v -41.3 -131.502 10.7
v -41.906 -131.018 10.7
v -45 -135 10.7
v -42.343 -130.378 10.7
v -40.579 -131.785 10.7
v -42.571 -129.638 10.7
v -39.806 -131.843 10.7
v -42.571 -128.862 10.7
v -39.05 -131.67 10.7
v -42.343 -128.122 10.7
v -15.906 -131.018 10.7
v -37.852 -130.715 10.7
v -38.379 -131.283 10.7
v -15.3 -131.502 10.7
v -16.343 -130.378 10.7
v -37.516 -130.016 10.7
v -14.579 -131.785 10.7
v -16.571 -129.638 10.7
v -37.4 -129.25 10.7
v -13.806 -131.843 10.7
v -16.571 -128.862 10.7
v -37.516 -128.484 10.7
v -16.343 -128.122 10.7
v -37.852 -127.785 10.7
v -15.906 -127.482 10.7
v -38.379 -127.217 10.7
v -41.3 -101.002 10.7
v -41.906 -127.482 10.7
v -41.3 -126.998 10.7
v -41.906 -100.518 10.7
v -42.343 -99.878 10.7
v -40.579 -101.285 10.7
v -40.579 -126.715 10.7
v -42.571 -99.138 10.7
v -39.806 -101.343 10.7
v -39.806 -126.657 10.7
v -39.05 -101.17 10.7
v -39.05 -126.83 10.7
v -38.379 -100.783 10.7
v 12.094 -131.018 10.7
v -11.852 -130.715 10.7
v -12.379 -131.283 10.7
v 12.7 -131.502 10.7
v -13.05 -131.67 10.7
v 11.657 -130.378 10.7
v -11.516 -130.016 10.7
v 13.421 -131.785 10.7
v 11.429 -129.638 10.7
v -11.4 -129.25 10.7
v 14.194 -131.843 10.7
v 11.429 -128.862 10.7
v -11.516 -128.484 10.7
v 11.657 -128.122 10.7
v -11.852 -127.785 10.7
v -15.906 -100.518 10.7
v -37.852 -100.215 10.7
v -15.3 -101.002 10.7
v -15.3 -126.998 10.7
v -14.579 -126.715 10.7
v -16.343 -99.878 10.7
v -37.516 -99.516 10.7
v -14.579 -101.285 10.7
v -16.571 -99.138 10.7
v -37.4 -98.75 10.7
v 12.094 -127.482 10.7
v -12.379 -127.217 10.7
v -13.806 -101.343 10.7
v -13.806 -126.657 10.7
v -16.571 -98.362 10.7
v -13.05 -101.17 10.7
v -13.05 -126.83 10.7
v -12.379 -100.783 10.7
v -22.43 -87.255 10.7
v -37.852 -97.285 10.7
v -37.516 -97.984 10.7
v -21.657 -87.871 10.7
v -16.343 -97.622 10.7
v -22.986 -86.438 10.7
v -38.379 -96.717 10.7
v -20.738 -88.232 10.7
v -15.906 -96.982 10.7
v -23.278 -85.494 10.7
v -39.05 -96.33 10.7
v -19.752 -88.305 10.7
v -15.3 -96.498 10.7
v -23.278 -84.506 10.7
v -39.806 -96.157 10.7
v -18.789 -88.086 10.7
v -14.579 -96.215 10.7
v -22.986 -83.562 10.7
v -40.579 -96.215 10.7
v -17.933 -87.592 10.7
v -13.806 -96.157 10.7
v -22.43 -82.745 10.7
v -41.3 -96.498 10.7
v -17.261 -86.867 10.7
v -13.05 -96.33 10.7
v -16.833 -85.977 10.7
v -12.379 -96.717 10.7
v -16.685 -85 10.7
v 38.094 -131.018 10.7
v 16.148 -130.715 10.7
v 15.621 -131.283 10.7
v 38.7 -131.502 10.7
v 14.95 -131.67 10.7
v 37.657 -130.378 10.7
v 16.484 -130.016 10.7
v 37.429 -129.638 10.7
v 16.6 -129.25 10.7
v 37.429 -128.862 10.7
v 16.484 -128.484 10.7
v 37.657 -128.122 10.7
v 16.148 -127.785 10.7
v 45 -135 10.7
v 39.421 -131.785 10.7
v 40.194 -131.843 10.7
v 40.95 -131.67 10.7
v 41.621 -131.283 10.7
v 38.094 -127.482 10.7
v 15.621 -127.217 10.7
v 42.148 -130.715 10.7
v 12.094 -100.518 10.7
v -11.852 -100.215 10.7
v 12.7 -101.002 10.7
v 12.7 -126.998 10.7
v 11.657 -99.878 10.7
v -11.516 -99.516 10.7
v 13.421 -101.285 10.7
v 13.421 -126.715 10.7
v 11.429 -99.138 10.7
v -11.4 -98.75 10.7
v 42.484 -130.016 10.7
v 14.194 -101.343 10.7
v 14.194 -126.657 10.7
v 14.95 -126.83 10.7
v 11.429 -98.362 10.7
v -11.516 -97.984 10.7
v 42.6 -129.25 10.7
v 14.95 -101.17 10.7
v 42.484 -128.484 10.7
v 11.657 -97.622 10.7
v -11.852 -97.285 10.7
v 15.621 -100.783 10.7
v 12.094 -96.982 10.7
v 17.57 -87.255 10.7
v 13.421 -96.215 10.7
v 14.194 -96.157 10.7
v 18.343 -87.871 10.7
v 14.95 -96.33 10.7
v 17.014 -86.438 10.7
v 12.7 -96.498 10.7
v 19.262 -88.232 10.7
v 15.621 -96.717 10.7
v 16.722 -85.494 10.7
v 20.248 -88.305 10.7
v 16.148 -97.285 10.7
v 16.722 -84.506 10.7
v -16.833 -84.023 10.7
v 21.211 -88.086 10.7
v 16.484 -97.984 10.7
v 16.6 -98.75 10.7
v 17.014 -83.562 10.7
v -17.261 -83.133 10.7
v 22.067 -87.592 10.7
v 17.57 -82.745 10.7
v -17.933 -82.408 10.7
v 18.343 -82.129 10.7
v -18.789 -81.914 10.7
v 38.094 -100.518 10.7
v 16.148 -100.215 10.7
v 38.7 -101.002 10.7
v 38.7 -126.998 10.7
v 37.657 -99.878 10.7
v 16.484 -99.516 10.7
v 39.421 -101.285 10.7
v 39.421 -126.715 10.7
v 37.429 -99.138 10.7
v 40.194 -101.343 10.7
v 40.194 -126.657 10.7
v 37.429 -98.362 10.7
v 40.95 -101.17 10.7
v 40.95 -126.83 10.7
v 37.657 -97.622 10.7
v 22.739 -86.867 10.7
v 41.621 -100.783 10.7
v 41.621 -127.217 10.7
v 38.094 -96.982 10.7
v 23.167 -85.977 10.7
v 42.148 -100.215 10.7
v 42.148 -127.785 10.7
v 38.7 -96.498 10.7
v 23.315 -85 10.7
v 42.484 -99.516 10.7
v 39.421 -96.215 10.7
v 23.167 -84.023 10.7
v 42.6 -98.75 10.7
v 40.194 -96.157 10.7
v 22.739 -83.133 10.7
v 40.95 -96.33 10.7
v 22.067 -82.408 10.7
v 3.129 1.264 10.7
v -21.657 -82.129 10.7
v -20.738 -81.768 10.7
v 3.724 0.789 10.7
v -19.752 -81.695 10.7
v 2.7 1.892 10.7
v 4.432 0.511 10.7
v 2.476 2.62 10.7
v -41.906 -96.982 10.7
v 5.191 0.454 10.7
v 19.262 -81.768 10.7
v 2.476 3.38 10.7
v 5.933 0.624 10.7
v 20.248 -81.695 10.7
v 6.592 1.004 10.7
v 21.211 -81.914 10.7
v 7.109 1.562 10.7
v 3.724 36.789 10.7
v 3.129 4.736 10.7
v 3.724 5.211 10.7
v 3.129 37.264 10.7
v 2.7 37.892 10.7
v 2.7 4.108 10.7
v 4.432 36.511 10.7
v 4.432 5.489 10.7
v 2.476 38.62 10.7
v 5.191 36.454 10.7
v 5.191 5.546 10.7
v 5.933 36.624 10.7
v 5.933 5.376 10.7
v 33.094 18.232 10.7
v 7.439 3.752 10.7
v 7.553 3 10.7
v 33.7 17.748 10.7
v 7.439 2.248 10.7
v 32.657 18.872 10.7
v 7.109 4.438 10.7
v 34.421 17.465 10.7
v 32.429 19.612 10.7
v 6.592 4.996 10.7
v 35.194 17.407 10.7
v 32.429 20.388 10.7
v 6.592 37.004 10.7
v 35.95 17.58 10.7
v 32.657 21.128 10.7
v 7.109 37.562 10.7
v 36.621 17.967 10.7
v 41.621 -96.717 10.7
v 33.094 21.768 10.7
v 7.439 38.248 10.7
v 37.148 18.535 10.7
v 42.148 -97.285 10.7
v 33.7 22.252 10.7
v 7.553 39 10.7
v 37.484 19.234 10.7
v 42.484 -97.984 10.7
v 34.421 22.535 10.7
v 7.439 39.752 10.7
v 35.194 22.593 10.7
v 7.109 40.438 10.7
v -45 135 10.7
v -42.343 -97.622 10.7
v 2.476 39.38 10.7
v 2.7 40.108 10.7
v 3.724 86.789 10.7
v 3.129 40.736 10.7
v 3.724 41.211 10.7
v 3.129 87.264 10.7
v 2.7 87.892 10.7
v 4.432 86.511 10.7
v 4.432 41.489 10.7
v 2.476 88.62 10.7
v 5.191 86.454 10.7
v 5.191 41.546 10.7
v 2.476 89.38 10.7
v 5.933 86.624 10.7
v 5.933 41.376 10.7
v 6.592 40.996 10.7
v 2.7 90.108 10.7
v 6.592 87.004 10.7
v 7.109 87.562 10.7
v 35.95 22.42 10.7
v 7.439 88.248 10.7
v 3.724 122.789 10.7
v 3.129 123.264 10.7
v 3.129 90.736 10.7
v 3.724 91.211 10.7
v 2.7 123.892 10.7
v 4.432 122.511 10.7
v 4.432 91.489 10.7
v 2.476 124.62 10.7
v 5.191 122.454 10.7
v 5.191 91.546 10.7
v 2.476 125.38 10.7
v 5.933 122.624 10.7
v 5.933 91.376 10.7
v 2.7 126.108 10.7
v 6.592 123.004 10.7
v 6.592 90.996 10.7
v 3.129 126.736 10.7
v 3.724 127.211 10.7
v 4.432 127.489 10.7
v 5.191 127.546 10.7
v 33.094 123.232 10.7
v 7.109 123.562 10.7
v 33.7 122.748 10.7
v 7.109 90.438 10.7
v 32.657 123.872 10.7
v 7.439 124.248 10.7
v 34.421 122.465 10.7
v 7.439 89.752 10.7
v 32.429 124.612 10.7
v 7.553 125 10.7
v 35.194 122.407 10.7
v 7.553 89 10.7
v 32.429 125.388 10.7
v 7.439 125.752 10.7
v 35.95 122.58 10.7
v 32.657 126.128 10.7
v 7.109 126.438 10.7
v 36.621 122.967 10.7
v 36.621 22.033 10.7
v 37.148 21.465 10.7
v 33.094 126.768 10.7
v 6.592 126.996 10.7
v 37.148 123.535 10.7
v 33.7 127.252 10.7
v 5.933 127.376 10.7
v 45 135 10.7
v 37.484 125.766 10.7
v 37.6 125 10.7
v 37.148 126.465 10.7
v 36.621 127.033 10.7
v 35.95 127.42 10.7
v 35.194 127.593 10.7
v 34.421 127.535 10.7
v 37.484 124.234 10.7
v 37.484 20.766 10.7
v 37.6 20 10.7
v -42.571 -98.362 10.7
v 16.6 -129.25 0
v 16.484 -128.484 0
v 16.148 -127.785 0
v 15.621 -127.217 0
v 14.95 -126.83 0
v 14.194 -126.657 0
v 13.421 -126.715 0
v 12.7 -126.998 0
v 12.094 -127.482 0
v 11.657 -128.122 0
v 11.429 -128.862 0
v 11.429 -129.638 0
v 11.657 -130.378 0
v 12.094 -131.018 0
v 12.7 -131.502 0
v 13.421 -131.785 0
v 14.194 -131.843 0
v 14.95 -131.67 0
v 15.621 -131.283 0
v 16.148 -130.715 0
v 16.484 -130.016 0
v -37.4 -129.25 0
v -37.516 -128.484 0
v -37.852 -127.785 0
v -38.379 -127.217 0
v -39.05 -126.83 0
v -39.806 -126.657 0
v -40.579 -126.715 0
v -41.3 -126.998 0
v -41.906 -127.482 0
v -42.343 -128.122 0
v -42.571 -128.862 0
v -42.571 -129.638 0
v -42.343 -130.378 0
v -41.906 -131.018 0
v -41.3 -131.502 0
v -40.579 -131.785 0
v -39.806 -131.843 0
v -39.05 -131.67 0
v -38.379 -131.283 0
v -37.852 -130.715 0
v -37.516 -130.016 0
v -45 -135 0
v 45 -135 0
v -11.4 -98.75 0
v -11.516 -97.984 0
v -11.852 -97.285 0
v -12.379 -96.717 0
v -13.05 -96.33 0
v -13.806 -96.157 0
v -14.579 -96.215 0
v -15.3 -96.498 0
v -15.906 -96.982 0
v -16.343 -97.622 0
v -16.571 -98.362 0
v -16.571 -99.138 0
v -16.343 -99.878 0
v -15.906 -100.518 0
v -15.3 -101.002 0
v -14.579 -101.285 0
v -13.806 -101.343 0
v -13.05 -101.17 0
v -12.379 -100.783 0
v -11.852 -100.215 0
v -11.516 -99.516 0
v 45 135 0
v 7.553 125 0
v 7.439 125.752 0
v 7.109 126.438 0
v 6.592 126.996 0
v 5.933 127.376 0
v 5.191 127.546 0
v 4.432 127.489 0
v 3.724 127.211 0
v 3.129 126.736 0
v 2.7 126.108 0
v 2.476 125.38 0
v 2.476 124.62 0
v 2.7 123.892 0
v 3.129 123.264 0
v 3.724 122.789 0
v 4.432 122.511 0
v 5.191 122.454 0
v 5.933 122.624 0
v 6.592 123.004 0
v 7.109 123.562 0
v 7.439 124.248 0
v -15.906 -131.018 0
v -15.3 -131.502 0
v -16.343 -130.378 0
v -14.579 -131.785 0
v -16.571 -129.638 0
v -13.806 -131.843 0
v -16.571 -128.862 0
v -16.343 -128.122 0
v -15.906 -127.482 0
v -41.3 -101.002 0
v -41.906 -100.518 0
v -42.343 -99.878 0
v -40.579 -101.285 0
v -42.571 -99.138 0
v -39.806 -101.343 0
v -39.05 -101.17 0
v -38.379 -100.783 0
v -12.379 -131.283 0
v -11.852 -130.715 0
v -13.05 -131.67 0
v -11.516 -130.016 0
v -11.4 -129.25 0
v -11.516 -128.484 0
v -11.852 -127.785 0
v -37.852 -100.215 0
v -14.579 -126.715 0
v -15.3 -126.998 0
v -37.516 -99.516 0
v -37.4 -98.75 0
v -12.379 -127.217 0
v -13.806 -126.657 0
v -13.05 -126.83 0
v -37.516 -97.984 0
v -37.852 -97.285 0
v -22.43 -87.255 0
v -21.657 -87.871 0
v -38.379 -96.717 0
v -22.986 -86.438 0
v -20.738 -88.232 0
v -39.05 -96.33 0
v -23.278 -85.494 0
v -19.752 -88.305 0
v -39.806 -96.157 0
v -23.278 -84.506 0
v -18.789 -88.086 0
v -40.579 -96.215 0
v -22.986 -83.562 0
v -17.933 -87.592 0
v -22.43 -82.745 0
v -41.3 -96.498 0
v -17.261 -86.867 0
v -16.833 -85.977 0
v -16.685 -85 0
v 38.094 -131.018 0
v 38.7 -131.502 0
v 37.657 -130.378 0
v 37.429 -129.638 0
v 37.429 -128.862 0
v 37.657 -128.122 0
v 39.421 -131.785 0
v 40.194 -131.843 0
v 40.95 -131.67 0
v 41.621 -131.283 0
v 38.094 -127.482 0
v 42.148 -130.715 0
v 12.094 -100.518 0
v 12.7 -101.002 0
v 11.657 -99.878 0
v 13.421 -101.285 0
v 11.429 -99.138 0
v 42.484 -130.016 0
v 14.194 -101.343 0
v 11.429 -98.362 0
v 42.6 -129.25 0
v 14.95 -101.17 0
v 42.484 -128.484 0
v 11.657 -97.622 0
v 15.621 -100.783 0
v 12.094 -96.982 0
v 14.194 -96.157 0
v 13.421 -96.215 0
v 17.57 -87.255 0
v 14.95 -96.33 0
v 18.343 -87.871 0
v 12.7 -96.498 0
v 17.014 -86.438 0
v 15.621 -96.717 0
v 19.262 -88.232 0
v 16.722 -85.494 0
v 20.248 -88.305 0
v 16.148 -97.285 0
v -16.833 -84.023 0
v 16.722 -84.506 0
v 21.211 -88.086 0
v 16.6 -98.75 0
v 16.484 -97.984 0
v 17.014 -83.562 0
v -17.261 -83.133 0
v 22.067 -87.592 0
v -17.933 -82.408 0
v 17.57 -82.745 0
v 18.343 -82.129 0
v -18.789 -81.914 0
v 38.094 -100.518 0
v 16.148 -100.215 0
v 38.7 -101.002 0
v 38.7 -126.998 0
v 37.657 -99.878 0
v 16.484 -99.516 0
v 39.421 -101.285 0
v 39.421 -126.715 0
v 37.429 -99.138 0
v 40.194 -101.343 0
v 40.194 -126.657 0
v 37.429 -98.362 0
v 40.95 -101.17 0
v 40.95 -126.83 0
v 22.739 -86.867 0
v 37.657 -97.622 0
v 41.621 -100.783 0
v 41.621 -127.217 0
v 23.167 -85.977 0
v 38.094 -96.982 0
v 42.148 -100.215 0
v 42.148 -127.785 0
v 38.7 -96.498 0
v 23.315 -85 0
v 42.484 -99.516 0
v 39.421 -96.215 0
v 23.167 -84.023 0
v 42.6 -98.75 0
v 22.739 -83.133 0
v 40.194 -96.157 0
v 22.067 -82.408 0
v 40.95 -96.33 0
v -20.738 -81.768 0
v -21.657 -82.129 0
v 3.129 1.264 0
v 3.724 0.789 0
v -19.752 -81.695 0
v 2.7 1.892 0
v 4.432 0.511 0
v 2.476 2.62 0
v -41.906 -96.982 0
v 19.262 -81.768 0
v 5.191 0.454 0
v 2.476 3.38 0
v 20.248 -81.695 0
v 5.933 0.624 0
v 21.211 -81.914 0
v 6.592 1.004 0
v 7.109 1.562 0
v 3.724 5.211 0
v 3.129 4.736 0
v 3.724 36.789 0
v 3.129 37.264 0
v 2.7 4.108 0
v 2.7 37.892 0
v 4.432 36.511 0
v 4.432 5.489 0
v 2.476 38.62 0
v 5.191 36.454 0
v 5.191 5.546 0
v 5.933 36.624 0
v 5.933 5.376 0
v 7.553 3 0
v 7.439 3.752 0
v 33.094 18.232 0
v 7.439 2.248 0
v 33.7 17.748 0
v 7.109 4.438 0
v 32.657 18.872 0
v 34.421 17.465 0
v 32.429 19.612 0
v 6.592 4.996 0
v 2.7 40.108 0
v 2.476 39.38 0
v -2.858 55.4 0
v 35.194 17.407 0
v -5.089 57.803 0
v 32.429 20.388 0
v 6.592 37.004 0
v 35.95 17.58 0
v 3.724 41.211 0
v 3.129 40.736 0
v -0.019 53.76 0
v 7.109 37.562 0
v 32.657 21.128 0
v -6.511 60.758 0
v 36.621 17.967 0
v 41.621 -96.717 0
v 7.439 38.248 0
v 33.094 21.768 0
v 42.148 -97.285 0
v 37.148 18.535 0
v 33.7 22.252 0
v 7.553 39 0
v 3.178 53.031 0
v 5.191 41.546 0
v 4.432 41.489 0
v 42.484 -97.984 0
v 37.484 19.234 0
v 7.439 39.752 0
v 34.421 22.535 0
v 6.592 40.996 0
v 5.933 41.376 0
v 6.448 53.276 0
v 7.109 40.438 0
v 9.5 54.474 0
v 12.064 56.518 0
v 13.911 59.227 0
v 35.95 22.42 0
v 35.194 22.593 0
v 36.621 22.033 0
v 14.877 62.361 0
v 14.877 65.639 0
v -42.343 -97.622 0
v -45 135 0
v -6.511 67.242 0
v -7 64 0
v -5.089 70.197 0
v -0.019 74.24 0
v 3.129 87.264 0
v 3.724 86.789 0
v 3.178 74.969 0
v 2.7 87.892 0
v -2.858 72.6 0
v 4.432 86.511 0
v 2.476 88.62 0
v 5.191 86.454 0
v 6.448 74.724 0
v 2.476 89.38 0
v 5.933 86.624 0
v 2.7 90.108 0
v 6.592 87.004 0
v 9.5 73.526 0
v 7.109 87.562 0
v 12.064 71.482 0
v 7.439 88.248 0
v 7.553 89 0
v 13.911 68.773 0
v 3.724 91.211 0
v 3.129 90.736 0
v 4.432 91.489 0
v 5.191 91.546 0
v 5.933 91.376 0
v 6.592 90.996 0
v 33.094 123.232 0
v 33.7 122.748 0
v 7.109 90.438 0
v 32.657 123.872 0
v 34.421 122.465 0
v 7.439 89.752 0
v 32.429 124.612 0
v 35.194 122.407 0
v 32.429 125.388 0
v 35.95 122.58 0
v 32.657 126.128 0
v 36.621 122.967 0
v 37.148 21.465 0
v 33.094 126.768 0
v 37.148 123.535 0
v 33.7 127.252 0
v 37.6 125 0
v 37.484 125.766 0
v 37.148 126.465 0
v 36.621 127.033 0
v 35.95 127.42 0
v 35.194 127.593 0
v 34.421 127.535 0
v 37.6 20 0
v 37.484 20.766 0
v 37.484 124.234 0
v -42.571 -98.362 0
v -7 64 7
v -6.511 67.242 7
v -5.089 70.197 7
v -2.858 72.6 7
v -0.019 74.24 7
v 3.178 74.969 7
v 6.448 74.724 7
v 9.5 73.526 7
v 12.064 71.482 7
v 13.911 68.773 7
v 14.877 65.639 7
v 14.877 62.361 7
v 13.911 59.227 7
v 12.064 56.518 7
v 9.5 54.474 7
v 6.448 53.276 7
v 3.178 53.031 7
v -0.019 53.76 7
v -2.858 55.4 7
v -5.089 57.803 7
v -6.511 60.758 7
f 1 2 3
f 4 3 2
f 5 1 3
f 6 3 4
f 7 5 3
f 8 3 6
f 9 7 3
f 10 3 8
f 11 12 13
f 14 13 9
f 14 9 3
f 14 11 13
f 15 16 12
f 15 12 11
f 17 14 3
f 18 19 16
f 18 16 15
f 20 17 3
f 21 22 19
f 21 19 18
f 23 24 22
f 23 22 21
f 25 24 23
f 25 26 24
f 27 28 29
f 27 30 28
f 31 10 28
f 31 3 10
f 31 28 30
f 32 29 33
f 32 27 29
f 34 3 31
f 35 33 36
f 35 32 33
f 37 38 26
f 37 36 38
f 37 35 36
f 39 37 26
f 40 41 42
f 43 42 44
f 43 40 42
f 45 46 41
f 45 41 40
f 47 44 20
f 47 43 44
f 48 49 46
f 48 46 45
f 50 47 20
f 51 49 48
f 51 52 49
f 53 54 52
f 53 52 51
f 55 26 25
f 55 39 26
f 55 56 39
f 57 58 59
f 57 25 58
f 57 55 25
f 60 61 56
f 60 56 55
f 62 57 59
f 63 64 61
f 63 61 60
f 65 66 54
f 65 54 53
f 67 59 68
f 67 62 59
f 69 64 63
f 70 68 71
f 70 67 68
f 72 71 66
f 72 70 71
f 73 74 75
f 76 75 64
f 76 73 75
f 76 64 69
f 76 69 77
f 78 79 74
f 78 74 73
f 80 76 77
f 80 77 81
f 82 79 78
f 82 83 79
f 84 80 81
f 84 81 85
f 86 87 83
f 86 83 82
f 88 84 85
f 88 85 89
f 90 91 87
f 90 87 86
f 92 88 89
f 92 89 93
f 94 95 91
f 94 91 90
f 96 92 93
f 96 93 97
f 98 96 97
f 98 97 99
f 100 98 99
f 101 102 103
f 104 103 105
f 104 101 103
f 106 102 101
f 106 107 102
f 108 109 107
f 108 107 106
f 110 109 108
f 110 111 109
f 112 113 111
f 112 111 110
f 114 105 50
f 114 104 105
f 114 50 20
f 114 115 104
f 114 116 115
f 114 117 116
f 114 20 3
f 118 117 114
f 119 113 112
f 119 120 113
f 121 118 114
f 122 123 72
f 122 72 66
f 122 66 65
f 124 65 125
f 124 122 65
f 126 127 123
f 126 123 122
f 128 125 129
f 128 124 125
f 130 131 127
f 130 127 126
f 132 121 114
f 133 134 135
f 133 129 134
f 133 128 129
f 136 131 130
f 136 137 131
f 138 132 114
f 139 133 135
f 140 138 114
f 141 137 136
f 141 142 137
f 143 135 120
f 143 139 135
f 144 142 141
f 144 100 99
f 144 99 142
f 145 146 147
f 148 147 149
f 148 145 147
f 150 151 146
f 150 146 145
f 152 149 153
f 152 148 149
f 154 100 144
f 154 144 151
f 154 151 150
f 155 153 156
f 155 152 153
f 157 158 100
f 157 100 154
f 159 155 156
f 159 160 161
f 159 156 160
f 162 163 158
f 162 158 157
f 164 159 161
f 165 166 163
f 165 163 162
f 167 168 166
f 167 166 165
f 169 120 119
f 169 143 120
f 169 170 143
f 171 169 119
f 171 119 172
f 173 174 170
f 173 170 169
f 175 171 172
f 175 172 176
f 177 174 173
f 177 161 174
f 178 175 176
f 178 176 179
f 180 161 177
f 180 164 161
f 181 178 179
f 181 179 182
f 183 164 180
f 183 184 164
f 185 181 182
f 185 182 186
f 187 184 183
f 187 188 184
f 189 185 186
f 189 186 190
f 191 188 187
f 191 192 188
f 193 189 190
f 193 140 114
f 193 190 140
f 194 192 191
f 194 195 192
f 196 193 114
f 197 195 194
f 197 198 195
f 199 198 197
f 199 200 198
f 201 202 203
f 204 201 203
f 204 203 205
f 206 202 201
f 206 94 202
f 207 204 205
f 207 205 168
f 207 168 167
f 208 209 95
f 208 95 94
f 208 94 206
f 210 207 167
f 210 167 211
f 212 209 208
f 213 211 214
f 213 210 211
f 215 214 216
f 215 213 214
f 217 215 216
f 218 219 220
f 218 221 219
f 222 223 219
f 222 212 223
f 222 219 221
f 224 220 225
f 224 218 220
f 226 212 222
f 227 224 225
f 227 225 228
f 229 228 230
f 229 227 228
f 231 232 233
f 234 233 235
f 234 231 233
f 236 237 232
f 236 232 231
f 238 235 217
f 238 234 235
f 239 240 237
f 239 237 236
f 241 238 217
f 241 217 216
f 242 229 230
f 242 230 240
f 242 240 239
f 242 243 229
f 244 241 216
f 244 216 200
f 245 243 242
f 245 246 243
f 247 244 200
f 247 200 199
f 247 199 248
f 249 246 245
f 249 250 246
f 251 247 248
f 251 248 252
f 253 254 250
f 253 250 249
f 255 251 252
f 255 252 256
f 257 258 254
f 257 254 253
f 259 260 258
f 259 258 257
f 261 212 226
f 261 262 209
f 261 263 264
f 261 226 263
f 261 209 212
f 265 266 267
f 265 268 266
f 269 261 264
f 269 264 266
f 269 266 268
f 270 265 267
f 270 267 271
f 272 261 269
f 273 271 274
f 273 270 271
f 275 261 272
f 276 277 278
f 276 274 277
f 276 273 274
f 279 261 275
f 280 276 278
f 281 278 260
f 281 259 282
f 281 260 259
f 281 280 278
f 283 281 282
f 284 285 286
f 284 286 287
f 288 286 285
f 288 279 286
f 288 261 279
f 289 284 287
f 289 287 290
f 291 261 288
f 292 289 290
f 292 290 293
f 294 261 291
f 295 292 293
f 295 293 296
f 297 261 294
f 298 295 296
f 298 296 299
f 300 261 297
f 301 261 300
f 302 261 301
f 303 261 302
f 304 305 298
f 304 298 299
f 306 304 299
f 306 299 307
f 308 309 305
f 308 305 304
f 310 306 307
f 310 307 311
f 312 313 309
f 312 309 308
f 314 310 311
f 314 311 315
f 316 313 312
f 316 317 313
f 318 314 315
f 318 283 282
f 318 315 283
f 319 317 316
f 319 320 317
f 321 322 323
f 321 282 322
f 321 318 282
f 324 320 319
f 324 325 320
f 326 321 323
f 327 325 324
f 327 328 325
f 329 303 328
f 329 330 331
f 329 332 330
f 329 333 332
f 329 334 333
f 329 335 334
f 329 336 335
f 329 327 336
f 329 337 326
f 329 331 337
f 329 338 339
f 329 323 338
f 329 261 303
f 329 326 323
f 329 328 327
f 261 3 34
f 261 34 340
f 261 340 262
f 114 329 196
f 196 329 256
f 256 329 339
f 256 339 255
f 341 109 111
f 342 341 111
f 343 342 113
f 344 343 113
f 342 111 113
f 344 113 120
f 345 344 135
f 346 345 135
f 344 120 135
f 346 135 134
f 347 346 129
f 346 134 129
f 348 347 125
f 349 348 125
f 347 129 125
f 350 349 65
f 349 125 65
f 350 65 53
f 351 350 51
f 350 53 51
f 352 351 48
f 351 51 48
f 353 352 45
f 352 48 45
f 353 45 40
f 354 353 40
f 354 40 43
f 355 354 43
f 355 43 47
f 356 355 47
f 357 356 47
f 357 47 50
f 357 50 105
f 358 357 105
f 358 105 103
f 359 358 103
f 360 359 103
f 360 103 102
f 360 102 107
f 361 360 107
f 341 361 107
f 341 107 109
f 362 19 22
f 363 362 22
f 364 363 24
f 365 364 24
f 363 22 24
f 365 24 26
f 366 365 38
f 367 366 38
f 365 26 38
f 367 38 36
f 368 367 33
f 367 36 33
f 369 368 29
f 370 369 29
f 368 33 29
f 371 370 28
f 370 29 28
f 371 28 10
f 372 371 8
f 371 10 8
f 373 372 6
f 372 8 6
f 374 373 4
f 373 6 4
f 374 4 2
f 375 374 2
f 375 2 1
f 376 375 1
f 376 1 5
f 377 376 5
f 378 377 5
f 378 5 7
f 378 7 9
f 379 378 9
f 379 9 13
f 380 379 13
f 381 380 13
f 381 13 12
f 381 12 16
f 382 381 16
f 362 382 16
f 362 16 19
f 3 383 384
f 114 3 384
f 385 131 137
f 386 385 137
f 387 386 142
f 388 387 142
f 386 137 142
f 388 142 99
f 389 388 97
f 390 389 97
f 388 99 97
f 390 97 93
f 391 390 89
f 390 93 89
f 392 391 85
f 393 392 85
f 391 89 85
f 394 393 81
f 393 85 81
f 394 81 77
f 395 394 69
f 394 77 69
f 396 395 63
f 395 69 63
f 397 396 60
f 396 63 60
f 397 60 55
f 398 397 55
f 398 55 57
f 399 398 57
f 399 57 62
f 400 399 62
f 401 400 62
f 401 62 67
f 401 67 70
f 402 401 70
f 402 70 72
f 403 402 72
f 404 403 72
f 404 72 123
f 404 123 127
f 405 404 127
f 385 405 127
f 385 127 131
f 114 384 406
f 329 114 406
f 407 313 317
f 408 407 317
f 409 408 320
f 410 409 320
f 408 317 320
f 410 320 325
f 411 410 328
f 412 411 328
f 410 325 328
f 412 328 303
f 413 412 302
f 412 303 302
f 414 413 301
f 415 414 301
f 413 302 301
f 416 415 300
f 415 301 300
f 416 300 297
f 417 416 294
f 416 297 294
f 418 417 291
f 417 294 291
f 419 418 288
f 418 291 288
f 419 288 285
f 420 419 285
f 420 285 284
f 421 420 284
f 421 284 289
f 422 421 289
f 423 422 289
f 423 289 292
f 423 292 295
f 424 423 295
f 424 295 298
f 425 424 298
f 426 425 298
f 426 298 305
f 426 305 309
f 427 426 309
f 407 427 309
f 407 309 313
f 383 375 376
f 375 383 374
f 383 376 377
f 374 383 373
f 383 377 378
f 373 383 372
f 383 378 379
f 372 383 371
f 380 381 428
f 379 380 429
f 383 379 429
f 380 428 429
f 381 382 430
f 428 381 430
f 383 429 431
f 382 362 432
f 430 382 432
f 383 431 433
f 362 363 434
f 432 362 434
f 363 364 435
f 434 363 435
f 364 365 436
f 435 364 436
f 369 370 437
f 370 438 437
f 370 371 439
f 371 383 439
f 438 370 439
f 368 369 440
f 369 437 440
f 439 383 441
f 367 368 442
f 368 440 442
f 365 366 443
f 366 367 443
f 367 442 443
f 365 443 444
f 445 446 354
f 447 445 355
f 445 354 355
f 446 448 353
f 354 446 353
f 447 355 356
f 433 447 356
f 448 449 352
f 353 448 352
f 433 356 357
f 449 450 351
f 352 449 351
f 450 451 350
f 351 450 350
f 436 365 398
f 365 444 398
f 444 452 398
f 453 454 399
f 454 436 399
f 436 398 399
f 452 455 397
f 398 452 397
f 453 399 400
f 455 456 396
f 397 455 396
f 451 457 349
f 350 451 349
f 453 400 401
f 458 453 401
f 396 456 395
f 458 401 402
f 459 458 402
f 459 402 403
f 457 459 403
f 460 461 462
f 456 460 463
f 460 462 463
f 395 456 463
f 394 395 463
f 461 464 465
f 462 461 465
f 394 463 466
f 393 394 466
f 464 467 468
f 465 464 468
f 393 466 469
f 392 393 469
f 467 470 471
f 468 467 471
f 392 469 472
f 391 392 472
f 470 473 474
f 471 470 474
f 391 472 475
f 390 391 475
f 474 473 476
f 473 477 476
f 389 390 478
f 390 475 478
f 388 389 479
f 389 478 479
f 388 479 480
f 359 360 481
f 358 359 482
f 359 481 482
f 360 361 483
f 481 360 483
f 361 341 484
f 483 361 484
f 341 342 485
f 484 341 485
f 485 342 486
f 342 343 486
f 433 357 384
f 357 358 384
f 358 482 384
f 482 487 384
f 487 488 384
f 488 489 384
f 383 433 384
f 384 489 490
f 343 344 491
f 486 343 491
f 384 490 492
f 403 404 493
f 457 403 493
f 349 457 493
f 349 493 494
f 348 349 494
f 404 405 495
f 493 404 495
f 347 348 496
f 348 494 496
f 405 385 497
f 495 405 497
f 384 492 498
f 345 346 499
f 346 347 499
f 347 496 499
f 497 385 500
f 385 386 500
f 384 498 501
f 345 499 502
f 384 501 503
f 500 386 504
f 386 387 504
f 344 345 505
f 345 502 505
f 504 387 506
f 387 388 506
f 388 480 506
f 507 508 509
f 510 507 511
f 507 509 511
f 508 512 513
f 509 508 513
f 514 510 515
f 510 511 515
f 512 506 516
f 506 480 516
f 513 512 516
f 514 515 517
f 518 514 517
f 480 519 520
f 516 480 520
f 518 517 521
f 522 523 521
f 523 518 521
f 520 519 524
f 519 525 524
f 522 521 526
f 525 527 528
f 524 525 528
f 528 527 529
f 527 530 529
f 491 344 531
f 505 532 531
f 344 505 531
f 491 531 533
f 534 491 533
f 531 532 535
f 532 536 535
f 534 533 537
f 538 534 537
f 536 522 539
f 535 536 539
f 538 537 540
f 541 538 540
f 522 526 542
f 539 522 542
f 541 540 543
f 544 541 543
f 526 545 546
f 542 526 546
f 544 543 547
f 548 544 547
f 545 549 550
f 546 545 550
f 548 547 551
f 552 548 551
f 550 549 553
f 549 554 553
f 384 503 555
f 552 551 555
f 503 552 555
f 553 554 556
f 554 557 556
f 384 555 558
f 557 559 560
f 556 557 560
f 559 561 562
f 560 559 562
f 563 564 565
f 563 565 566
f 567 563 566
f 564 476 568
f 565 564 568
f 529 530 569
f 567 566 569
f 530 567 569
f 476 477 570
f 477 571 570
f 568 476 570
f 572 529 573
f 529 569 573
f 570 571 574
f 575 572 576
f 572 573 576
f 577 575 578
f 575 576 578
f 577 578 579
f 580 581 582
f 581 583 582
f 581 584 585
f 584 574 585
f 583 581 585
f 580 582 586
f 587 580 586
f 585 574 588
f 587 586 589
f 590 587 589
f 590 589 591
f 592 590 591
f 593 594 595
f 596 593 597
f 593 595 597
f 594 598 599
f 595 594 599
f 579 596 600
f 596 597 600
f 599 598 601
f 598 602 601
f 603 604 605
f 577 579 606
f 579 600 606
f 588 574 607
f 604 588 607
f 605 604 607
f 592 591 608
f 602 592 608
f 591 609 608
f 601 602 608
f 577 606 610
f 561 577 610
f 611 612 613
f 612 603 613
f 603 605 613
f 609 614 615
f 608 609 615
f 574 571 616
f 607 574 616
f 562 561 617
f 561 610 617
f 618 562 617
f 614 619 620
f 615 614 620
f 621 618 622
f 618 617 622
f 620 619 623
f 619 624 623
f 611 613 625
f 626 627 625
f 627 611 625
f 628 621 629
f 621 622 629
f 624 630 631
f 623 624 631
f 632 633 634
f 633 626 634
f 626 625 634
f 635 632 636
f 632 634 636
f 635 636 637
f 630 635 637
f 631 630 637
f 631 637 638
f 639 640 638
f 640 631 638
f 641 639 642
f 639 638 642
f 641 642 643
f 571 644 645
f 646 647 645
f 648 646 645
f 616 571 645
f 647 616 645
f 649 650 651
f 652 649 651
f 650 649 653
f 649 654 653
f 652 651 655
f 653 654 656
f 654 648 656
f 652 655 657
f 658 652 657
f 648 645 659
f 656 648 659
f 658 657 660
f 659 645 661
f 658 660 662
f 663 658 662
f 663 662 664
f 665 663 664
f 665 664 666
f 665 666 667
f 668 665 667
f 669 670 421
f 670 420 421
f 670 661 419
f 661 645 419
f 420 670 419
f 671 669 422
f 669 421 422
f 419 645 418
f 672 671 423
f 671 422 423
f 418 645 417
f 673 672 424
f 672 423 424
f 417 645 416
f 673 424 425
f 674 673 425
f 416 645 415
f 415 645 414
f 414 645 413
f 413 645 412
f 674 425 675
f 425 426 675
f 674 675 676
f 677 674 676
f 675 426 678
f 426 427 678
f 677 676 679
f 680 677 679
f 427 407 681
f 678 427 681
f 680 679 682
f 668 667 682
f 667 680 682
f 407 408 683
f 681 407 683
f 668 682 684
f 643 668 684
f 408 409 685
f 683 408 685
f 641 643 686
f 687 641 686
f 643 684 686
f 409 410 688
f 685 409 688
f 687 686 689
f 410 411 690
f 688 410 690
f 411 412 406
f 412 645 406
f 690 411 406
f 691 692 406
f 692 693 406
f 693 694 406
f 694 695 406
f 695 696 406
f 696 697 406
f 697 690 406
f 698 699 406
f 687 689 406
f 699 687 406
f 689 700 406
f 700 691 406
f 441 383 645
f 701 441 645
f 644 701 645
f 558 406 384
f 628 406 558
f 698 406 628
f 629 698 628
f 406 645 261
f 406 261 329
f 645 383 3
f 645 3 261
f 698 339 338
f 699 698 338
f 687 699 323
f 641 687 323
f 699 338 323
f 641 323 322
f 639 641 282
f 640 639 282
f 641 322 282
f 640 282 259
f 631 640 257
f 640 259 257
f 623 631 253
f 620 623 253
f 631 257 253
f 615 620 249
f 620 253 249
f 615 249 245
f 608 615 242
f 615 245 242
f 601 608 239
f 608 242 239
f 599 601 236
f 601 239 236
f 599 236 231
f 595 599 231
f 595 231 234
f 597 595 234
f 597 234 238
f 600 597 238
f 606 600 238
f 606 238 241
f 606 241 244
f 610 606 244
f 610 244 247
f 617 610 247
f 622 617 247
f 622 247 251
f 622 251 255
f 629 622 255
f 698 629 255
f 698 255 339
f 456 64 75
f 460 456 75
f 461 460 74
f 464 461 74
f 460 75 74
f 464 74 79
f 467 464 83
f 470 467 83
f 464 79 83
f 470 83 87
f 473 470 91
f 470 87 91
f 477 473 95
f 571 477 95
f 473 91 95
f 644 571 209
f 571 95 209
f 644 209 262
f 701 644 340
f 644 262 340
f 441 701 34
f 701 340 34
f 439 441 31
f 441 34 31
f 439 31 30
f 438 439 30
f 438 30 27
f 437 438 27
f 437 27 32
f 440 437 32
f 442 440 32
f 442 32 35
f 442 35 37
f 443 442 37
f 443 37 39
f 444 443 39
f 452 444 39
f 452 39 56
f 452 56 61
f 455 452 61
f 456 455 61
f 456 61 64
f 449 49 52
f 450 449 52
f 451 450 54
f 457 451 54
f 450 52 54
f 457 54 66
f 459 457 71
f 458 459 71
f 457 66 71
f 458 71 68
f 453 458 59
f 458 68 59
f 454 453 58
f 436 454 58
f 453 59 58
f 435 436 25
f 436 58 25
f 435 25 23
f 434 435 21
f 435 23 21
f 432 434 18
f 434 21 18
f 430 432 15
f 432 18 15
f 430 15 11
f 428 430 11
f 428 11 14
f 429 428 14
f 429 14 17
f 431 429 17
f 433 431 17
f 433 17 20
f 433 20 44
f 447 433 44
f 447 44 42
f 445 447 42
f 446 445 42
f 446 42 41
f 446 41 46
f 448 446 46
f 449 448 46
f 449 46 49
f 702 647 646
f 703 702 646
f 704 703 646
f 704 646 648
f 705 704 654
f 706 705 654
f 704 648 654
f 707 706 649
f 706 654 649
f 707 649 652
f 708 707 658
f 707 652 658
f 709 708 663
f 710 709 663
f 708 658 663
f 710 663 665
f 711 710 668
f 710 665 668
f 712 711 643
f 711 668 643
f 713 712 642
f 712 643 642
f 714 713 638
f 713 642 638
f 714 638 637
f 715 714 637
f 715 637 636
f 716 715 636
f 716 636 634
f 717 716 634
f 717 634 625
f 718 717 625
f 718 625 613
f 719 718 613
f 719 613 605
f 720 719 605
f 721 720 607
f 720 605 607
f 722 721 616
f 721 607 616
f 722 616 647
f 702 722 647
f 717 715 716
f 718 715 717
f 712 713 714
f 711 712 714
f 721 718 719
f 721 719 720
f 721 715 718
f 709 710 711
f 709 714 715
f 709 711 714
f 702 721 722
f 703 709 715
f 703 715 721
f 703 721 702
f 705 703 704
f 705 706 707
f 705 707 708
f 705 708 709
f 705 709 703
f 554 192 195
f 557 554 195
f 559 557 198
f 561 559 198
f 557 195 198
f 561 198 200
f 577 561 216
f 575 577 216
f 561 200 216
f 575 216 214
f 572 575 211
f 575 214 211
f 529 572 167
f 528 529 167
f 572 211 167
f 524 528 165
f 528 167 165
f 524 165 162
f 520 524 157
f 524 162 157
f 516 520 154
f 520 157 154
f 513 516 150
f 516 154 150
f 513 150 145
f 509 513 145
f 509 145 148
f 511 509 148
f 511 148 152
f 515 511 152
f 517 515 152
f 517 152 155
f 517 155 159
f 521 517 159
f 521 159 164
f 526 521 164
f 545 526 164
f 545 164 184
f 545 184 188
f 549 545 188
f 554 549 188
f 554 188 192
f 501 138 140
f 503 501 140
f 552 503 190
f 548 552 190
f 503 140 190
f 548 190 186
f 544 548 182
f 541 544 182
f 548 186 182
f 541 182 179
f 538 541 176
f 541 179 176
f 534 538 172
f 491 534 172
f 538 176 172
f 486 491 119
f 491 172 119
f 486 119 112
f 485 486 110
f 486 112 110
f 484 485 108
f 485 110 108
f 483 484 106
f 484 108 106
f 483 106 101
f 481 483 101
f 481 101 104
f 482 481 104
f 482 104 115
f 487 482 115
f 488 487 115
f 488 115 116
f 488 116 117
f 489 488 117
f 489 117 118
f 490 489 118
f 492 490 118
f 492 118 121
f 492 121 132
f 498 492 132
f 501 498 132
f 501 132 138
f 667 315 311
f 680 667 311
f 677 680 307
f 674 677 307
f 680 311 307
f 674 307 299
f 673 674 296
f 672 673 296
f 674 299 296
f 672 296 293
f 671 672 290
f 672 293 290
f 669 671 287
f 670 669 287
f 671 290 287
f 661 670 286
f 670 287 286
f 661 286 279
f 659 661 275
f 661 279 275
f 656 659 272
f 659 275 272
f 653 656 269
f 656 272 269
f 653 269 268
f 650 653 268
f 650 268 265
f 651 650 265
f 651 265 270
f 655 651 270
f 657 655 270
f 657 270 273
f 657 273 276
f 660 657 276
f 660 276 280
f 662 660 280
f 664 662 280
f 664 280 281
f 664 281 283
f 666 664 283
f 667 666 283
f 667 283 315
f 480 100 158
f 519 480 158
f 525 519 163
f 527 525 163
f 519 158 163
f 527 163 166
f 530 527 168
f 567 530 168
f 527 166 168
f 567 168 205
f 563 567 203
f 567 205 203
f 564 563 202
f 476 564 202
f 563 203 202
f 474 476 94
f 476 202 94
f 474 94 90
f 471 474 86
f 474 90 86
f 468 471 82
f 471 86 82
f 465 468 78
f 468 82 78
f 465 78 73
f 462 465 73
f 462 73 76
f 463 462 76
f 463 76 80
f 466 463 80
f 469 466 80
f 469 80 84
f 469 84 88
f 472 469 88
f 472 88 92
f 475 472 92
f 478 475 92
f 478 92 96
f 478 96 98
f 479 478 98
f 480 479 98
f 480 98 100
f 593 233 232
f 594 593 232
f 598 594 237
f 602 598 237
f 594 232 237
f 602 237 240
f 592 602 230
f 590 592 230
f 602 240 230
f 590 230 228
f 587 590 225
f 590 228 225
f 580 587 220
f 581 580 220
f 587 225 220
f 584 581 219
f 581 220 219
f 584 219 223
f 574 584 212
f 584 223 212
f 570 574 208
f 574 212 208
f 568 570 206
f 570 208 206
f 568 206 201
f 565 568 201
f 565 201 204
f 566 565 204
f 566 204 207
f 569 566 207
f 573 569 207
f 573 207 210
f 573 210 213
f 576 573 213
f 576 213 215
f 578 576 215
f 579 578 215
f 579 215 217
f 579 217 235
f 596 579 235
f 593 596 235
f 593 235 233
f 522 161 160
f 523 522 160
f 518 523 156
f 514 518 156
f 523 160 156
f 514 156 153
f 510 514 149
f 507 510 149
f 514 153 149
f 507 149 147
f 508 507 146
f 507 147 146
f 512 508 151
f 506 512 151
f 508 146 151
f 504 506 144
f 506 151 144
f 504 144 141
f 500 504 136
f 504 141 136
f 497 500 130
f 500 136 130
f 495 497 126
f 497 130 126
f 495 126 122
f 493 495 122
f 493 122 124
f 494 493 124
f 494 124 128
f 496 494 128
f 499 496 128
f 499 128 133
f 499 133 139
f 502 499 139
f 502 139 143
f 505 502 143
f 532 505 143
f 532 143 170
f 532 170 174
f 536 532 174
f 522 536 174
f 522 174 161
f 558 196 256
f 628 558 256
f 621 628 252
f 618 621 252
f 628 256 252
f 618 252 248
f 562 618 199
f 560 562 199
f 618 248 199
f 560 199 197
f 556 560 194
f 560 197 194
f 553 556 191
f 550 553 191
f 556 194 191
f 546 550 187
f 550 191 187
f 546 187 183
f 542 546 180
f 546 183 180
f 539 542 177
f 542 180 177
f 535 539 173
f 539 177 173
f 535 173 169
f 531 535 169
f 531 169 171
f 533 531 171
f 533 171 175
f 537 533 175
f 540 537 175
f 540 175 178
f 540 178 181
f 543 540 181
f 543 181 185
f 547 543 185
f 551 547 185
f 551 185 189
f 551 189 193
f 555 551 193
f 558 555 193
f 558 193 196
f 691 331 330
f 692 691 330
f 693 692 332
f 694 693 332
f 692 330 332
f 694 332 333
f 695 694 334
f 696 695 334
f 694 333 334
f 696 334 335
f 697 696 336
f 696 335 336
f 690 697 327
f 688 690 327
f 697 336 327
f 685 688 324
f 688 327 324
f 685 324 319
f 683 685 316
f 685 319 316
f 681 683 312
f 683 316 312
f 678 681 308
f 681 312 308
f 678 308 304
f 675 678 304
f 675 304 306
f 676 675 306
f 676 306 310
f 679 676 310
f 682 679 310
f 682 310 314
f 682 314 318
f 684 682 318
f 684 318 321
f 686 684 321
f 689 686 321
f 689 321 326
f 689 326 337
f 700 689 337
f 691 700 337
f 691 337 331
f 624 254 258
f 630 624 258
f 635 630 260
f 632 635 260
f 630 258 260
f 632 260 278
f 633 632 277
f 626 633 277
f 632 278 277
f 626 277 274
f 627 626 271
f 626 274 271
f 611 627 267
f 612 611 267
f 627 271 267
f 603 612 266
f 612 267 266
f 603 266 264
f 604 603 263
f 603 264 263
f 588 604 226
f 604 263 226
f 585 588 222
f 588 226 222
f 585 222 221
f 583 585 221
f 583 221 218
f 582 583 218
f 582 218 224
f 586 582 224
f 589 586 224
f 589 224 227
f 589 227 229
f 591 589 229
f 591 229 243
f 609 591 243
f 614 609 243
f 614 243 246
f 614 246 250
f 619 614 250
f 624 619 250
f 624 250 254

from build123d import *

# Parameters (mm, degrees)
ESBO_O1_W                               = 90
ESBO_O1_H                               = 270
RESSALTO_EXTRUS_O1_DEPTH                = 10.7
FURO_ROSCADO_PARA_CONDU_TE_DE_M5X0_81_D = 5.2
FURO_ROSCADO_PARA_CONDU_TE_DE_1_4_281_D = 6.6294
FURO_ROSCADO_PARA_CONDU_TE_DE_M5X0_82_D = 5.2
FURO_ROSCADO_PARA_CONDU_TE_DE_10_321_D  = 5.1054
ESBO_O16_R                              = 11
CORTE_EXTRUS_O1_DEPTH                   = 7


with BuildPart() as part:
    # Esboço1 → Ressalto-extrusão1 (new body)
    with BuildSketch(Plane.XY):
        Rectangle(ESBO_O1_W, ESBO_O1_H)
    extrude(amount=RESSALTO_EXTRUS_O1_DEPTH)

    # Furo roscado para conduíte de M5x0.81 (through all)
    with Locations(Plane(origin=(0, 0, 0), x_dir=(-1, 0, 0), z_dir=(0, 0, -1))):
        with Locations((-40, -98.75), (-40, -129.25), (-14, -129.25), (-14, -98.75), (14, -98.75), (14, -129.25), (40, -129.25), (40, -98.75)):
            Hole(FURO_ROSCADO_PARA_CONDU_TE_DE_M5X0_81_D / 2)

    # Furo roscado para conduíte de 1/4-281 (through all)
    with Locations(Plane(origin=(0, 0, 0), x_dir=(-1, 0, 0), z_dir=(0, 0, -1))):
        with Locations((-20, -85), (20, -85)):
            Hole(FURO_ROSCADO_PARA_CONDU_TE_DE_1_4_281_D / 2)

    # Furo roscado para conduíte de M5x0.82 (through all)
    with Locations(Plane(origin=(0, 0, 0), x_dir=(-1, 0, 0), z_dir=(0, 0, -1))):
        with Locations((-35, 125), (-35, 20)):
            Hole(FURO_ROSCADO_PARA_CONDU_TE_DE_M5X0_82_D / 2)

    # Furo roscado para conduíte de #10-321 (through all)
    with Locations(Plane(origin=(0, 0, 0), x_dir=(-1, 0, 0), z_dir=(0, 0, -1))):
        with Locations((-5, 125), (-5, 89), (-5, 39), (-5, 3)):
            Hole(FURO_ROSCADO_PARA_CONDU_TE_DE_10_321_D / 2)

    # Esboço16 → Corte-extrusão1 (cut)
    with BuildSketch(Plane(origin=(0, 0, 0), x_dir=(-1, 0, 0), z_dir=(0, 0, -1))):
        with Locations((-4, 64)):
            Circle(ESBO_O16_R)
    extrude(amount=-CORTE_EXTRUS_O1_DEPTH, mode=Mode.SUBTRACT)


solid = part.part
